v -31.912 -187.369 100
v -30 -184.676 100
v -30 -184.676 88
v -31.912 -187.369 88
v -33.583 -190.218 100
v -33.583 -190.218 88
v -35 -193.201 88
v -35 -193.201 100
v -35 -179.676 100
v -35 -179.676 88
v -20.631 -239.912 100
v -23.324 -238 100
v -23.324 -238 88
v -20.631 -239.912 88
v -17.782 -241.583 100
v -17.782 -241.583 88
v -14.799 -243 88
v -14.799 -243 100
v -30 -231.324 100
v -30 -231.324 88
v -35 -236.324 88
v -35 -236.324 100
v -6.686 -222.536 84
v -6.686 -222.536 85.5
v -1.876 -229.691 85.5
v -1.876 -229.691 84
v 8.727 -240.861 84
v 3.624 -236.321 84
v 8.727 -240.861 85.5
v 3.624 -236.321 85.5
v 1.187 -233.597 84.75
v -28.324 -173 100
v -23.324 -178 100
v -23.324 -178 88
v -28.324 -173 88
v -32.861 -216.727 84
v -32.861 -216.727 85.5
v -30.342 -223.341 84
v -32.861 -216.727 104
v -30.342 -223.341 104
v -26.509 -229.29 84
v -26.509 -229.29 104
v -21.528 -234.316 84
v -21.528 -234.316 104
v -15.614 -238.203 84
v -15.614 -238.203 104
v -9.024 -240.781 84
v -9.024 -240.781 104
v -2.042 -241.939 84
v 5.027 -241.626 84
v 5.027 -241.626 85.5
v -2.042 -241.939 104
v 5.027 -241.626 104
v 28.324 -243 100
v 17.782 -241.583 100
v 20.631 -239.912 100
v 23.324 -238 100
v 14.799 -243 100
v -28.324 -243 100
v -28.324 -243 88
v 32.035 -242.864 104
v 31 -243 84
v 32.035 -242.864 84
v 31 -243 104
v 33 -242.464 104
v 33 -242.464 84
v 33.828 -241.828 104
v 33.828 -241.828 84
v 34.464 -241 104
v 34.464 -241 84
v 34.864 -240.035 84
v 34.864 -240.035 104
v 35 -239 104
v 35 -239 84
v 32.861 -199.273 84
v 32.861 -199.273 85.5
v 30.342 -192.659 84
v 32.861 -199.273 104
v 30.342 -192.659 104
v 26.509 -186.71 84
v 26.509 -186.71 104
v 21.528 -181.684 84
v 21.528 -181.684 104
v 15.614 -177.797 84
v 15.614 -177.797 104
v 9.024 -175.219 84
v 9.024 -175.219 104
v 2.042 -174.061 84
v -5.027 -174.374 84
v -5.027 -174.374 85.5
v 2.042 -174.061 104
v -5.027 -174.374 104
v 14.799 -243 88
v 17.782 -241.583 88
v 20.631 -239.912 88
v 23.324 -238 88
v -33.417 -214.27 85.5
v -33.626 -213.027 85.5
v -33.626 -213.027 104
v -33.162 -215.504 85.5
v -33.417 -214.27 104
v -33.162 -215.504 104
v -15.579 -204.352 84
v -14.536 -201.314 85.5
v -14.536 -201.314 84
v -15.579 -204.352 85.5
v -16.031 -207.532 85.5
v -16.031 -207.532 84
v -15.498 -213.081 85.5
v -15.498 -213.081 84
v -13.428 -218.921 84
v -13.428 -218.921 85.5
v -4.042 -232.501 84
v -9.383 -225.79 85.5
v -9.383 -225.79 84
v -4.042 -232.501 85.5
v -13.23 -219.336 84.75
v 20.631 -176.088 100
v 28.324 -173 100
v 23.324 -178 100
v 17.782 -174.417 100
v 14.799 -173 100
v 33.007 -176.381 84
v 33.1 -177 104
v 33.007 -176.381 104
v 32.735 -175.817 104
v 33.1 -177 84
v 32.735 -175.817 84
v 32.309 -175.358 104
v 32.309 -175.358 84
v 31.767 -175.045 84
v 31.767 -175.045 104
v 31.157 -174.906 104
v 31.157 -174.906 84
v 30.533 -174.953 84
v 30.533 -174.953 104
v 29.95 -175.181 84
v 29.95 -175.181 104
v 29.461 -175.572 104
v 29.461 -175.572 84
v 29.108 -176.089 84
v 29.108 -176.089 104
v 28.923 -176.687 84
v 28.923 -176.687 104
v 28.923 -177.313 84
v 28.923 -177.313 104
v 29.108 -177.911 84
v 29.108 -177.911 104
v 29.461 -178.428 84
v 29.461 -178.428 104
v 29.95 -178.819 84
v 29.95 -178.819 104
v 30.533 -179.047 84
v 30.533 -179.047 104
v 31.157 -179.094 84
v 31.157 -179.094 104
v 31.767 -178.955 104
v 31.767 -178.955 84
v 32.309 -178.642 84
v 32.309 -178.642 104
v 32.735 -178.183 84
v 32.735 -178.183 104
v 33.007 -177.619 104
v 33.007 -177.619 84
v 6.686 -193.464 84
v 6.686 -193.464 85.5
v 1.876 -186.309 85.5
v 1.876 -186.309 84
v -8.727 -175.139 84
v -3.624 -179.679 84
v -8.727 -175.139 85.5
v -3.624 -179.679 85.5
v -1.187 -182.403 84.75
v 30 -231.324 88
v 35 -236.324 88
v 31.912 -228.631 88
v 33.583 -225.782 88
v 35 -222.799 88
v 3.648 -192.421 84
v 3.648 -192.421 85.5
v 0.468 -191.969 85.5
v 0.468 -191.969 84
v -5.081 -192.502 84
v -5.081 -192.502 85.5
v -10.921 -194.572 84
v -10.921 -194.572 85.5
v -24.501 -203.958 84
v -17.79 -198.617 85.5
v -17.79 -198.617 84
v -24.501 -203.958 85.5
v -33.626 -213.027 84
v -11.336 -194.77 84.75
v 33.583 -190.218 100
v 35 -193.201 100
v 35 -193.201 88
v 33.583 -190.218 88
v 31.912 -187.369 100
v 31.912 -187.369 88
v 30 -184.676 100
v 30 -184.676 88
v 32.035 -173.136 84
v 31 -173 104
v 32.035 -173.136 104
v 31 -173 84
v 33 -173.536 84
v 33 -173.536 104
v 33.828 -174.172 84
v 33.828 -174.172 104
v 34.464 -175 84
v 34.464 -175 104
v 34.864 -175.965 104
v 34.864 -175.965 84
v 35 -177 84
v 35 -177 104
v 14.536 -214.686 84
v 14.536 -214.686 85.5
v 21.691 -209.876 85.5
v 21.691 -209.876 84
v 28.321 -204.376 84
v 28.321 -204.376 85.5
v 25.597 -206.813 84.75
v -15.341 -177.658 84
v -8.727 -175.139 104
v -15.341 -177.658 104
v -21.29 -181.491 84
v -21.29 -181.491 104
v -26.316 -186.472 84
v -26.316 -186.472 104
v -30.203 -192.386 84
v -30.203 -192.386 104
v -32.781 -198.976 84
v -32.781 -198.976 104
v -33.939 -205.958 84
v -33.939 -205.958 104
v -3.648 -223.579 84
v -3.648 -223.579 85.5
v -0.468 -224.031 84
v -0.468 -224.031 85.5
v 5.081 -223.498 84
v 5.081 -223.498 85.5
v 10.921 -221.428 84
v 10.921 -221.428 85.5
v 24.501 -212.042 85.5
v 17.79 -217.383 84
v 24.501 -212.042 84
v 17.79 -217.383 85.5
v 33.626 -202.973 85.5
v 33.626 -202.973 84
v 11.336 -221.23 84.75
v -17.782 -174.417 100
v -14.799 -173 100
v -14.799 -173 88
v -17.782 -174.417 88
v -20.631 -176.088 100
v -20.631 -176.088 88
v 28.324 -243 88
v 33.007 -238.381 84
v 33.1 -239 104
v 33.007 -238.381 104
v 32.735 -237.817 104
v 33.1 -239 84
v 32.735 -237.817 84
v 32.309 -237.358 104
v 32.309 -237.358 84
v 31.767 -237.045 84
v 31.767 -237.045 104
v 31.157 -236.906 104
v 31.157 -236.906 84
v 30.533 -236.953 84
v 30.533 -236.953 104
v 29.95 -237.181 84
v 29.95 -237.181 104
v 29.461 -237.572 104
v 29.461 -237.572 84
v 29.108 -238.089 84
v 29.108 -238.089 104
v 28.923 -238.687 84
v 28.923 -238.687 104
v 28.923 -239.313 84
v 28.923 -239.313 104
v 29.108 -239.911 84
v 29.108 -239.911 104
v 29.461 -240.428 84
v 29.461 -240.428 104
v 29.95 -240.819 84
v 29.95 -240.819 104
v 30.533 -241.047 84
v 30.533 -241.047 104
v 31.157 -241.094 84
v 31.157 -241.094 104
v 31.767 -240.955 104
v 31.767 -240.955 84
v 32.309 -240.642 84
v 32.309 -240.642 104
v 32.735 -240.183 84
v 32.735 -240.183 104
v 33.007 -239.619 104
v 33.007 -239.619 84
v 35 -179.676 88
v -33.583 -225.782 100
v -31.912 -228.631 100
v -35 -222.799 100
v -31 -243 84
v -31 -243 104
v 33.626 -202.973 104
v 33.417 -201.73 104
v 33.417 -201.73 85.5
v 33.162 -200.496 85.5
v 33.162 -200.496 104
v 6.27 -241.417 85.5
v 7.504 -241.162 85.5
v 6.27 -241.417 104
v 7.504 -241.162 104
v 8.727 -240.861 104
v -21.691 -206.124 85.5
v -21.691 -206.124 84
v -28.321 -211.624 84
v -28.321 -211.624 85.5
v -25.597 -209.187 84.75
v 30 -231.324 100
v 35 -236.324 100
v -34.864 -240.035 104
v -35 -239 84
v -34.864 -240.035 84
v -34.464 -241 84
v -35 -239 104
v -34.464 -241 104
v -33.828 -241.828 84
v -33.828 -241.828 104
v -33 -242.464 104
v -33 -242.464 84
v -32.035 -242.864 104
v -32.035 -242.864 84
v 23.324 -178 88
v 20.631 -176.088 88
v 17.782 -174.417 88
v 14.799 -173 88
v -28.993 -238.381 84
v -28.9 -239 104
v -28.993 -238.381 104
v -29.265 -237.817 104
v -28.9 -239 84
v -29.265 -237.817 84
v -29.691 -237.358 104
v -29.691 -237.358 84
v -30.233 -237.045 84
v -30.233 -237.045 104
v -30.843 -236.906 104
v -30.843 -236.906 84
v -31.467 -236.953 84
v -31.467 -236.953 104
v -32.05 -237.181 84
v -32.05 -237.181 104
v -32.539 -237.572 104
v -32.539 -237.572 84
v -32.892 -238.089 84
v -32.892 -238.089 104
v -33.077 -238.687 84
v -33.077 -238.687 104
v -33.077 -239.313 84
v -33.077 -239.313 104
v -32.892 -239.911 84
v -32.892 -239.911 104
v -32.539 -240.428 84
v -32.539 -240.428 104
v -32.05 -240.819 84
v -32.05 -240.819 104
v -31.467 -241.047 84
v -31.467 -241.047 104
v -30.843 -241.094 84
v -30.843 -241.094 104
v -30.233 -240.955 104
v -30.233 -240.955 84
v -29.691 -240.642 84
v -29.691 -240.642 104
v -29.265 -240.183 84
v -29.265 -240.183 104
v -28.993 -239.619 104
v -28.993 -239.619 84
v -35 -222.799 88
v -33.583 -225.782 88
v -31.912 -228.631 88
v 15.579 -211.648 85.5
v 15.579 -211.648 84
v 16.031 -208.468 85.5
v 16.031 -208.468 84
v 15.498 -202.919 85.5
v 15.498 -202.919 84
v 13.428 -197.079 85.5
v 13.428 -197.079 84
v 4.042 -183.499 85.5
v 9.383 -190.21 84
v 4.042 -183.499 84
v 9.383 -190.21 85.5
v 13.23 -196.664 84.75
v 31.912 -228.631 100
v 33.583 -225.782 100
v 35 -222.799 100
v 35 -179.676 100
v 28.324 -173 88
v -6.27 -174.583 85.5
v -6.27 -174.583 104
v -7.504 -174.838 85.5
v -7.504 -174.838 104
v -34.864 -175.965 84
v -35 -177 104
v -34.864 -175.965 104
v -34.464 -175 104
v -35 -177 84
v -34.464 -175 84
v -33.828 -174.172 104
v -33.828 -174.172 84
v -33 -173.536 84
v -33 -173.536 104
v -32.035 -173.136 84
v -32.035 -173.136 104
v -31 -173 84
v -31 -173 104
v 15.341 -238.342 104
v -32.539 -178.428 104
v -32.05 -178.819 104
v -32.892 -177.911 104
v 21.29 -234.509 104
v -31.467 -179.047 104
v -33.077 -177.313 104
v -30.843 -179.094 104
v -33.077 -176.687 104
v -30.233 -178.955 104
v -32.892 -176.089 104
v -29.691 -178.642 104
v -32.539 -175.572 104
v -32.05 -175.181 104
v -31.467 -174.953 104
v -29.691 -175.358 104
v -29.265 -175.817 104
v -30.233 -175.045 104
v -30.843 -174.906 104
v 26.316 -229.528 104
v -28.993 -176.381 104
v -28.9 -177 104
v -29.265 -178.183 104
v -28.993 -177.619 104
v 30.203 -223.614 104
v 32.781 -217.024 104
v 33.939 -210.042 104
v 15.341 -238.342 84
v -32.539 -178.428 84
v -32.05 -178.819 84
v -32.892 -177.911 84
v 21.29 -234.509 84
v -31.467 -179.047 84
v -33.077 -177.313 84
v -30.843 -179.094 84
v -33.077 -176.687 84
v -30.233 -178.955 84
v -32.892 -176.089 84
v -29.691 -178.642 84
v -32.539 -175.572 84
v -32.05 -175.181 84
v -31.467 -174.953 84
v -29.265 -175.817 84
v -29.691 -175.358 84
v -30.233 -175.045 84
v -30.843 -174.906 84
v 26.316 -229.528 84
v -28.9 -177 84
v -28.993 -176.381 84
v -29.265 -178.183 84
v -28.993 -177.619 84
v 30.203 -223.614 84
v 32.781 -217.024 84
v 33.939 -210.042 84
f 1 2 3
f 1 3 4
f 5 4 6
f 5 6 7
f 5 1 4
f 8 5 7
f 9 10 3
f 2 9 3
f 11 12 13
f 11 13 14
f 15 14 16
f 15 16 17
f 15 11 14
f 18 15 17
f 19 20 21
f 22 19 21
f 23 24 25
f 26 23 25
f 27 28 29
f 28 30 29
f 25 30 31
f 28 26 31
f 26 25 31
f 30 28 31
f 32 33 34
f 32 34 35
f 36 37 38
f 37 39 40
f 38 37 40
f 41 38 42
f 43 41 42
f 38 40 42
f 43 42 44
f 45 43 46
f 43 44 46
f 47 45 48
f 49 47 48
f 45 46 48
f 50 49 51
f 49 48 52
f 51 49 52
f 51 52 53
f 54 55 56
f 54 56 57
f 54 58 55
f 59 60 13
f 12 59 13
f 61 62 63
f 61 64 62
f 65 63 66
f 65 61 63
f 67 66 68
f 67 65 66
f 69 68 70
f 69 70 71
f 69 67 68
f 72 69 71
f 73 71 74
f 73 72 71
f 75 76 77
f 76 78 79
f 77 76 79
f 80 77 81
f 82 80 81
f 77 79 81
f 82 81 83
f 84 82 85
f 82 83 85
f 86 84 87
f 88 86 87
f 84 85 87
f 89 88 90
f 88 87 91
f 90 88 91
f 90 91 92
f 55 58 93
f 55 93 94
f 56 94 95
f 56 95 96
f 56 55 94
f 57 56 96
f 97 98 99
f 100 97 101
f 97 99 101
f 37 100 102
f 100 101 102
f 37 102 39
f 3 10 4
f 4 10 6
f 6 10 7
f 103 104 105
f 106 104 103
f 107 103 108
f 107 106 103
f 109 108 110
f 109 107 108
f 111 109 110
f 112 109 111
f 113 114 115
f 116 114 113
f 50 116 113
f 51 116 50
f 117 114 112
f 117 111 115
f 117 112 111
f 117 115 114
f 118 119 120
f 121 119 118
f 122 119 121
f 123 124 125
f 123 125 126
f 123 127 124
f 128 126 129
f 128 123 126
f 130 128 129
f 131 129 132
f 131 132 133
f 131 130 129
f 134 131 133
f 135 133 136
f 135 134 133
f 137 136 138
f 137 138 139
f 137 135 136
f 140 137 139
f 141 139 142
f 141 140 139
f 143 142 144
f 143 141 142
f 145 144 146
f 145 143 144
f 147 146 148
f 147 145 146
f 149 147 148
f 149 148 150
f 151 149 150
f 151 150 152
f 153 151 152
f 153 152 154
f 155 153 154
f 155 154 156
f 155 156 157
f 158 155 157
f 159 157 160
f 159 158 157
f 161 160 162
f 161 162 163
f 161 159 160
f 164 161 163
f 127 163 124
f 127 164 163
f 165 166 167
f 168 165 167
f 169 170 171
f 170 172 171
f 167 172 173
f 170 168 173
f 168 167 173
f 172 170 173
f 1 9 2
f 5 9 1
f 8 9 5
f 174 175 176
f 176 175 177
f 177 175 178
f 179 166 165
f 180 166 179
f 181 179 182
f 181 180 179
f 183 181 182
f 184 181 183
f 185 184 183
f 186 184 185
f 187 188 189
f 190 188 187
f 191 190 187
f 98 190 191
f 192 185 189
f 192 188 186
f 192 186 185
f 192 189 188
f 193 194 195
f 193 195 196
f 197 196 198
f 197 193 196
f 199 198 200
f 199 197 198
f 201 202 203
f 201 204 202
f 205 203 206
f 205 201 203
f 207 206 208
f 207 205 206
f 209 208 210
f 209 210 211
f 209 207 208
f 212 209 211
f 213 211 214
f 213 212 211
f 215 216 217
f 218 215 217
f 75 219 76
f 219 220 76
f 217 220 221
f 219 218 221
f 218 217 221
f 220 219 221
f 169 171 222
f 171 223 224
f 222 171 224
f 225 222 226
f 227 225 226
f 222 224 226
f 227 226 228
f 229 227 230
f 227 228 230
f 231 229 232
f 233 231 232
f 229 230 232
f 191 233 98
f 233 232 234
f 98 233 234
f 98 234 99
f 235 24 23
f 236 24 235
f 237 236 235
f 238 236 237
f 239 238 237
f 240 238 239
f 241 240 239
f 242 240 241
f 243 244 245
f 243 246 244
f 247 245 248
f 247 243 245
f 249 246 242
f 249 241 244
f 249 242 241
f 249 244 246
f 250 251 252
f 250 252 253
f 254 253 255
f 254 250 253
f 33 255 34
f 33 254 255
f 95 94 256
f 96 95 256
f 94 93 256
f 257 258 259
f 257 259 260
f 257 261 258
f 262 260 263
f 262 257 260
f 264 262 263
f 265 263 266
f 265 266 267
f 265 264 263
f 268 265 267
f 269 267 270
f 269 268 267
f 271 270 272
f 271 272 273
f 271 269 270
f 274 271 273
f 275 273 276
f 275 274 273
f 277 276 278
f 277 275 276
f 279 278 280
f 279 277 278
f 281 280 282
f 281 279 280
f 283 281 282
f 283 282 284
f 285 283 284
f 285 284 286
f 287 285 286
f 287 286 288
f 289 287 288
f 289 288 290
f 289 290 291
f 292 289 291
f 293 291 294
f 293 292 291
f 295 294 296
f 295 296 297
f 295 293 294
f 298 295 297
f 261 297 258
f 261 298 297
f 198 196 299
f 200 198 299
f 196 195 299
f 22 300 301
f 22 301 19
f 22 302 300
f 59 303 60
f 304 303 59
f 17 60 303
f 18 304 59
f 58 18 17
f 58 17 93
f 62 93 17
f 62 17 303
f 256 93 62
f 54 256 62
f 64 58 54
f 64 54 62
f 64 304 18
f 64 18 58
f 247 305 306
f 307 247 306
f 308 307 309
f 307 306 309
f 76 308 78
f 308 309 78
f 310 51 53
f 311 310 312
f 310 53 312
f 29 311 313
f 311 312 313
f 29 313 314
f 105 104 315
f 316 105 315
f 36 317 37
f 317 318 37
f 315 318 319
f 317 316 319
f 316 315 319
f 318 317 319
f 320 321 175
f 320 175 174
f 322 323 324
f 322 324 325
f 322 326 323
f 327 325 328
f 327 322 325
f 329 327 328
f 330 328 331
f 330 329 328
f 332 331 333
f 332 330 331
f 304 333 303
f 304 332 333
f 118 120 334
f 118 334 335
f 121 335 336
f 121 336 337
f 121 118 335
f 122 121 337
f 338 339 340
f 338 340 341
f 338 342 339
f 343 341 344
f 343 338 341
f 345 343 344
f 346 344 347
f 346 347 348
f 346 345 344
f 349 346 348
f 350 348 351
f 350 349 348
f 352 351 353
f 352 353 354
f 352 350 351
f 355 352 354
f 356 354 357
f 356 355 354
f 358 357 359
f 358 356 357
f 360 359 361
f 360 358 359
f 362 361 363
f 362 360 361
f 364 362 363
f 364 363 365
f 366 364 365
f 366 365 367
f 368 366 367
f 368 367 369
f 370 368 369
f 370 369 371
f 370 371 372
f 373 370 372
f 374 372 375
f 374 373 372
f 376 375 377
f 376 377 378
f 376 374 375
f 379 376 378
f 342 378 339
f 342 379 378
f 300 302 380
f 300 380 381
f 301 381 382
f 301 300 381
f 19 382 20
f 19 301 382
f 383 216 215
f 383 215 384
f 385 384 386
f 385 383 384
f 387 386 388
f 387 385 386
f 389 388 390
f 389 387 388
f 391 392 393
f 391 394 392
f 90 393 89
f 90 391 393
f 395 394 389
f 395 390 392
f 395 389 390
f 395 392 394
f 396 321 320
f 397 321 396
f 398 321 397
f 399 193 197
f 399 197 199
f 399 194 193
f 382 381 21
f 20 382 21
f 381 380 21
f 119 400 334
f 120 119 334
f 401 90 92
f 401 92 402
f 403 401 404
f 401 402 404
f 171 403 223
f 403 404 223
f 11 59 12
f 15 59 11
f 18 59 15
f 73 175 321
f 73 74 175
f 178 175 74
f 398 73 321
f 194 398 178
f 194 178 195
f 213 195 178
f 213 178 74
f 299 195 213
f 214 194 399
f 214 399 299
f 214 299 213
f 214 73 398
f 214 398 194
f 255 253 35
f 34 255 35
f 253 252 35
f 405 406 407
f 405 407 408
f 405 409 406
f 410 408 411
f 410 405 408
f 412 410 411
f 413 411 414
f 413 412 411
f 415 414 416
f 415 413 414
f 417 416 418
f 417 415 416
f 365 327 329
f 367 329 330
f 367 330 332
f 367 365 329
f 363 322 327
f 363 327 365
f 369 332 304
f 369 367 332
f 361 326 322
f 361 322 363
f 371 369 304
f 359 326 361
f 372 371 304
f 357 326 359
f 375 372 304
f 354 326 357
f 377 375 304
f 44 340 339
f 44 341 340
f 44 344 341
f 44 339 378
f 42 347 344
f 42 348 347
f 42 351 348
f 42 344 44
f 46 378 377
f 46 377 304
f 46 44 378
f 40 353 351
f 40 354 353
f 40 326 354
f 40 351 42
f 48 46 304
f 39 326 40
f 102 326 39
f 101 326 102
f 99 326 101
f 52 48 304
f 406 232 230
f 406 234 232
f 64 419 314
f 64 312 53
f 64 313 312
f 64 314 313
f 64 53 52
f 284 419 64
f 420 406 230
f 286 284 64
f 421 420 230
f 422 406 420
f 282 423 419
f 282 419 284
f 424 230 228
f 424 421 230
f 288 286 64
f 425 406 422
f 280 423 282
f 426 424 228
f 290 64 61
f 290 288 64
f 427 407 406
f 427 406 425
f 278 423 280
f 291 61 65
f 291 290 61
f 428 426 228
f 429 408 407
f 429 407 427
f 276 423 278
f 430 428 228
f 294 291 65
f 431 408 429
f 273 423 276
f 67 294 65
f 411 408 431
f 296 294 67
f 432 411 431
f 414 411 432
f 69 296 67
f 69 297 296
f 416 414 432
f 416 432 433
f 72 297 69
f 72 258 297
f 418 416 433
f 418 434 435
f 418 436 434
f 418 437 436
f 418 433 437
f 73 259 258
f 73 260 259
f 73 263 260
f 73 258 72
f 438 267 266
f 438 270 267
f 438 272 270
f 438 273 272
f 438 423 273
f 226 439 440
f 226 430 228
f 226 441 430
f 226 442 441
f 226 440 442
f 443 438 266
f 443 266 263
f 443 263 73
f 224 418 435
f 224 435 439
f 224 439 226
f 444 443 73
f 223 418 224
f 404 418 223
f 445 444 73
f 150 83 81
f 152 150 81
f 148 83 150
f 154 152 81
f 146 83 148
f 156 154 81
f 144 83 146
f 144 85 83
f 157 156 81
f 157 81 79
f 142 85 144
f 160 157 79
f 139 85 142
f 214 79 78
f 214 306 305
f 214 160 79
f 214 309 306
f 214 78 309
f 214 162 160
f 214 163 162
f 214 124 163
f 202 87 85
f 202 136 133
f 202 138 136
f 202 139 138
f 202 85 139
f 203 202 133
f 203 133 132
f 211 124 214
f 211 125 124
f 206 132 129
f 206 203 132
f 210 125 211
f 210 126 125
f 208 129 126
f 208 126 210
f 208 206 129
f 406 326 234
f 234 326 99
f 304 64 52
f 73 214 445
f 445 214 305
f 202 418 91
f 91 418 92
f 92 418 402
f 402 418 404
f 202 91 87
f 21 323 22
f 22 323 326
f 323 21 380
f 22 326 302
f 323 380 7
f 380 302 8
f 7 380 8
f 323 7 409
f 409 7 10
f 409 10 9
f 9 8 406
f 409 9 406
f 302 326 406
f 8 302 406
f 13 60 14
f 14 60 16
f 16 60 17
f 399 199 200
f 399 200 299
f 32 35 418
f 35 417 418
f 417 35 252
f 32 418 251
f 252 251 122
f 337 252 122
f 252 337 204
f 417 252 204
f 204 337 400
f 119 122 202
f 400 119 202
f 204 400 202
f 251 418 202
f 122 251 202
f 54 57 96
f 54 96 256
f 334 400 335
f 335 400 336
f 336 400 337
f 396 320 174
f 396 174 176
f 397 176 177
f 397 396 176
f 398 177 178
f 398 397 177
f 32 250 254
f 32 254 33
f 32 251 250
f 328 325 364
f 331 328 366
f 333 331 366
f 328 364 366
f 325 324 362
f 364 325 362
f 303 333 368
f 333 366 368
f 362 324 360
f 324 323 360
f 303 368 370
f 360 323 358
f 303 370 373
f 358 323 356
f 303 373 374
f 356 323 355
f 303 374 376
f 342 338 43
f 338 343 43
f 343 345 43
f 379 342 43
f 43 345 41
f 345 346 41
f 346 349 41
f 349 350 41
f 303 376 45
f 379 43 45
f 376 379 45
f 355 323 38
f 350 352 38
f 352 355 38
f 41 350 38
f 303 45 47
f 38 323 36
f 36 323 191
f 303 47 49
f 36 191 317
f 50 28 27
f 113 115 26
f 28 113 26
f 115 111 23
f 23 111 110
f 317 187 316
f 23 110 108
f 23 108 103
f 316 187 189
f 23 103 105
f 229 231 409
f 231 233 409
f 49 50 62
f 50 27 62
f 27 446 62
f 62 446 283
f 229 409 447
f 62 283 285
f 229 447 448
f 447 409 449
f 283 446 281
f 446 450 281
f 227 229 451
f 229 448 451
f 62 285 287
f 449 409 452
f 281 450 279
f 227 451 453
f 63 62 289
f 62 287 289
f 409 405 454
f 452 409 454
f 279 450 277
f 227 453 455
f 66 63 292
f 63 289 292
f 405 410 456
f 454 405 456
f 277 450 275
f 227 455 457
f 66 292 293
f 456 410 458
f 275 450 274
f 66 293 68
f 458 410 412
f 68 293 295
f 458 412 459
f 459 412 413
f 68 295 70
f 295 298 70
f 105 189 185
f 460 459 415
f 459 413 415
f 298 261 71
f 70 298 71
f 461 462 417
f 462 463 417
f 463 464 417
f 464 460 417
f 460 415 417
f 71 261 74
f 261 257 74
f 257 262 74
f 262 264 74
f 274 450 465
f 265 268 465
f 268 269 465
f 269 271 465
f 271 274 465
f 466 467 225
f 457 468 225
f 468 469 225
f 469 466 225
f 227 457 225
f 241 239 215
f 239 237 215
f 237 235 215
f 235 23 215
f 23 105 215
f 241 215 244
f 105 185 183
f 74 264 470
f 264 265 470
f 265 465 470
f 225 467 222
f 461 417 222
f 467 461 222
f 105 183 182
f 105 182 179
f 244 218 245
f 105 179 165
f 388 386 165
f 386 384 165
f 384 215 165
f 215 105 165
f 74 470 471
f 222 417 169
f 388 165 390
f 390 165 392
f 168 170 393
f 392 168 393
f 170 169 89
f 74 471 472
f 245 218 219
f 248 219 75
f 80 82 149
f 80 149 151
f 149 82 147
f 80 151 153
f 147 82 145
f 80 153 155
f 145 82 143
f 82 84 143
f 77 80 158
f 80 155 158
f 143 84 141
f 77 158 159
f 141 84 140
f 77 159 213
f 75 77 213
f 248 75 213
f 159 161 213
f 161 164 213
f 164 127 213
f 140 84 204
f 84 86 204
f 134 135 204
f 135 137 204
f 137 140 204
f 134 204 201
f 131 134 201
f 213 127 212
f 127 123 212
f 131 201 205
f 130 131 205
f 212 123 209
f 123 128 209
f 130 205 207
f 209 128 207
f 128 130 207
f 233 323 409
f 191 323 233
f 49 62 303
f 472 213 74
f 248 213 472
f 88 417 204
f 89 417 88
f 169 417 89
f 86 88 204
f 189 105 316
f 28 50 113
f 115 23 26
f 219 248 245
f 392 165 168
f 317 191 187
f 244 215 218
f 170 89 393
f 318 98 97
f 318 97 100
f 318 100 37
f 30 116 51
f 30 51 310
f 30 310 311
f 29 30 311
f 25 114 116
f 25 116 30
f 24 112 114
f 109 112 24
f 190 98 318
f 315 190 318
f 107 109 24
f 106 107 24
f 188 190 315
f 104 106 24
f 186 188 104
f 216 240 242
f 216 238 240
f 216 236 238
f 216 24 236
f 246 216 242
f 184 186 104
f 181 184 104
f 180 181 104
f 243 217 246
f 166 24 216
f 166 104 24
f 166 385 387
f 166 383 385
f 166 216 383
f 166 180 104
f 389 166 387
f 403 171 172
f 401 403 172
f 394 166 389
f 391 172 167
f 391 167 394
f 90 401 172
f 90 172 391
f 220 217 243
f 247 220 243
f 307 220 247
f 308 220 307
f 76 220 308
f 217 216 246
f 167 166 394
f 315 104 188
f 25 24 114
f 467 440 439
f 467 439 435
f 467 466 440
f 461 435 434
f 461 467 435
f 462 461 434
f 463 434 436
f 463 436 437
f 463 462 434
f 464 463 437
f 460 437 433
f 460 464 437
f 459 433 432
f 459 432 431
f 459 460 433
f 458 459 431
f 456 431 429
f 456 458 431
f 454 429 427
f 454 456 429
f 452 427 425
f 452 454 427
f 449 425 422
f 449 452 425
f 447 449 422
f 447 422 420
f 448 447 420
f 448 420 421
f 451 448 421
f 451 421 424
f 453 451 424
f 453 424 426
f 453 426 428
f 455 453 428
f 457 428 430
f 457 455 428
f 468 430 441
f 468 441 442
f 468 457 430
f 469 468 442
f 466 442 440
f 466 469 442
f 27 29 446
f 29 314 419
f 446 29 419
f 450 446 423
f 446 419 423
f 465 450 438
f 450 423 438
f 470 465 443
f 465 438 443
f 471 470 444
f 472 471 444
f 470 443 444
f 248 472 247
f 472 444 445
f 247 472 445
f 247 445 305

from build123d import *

# Parameters (mm, degrees)
SKETCH030_W           = 70
SKETCH030_H           = 70
SKETCH030_R           = 2.1
PAD019_DEPTH          = 10
POCKET014_DEPTH       = 221.9910987672
POLARPATTERN002_COUNT = 4
FILLET011_R           = 4
SKETCH032_R           = 34
POCKET018_DEPTH       = 18.5
POCKET017_DEPTH       = 6
POLARPATTERN003_COUNT = 4


with BuildPart() as part:
    # Sketch030 → Pad019 (new body, symmetric)
    with BuildSketch(Plane.XY):
        Rectangle(SKETCH030_W, SKETCH030_H)
        with Locations((-31, 31)):
            Circle(SKETCH030_R, mode=Mode.SUBTRACT)
        with Locations((31, 31)):
            Circle(SKETCH030_R, mode=Mode.SUBTRACT)
        with Locations((31, -31)):
            Circle(SKETCH030_R, mode=Mode.SUBTRACT)
        with Locations((-31, -31)):
            Circle(SKETCH030_R, mode=Mode.SUBTRACT)
    extrude(amount=PAD019_DEPTH, both=True)

    # Sketch029 (on Face10 of Pad019) → Pocket014 (cut, through all)
    with BuildSketch(Plane.XY.offset(10)):
        with BuildLine():
            ThreePointArc((-8.7274847969, 32.8607822354), (-28.4137092085, 18.6724698156), (-33.6262546007, -5.0274249403))
            add(Edge.make_bspline(
                [(6.6856437151, 14.5362363807), (-9.201321, 21.706085), (-33.6262546007, -5.0274249403)],
                knots=[0, 0, 0, 1, 1, 1], degree=2))
            add(Edge.make_bspline(
                [(6.6856437151, 14.5362363807), (-1.353872, 27.495132), (-8.7274847969, 32.8607822354)],
                knots=[0, 0, 0, 1, 1, 1], degree=2))
        make_face()
    pocket014 = extrude(amount=-POCKET014_DEPTH, mode=Mode.SUBTRACT)

    # PolarPattern002: Pocket014 ×4 about axis
    polarpattern002_axis = Axis((0, 0, 10), (0, 0, 1))
    for i in range(1, POLARPATTERN002_COUNT):
        add(pocket014.rotate(polarpattern002_axis, i * 360 / POLARPATTERN002_COUNT), mode=Mode.SUBTRACT)

    # Fillet011
    fillet011_edges = [part.edges().sort_by_distance(p)[0] for p in [
        (35, 35, 0),
        (-35, 35, 0),
        (35, -35, 0),
        (-35, -35, 0),
    ]]
    fillet(fillet011_edges, radius=FILLET011_R)

    # Sketch032 (on Face5 of Fillet011) → Pocket018 (cut)
    with BuildSketch(Plane.XY.offset(10)):
        Circle(SKETCH032_R)
    extrude(amount=-POCKET018_DEPTH, mode=Mode.SUBTRACT)

    # Sketch033 → Pocket017 (cut, symmetric)
    with BuildSketch(Plane.XY):
        with BuildLine():
            ThreePointArc((23.3238075794, 30), (0, 38), (-23.3238075794, 30))
            Line((-23.3238075794, 30), (-29, 35.6761924206))
            Line((-29, 35.6761924206), (-29, 47.6761924206))
            Line((-29, 47.6761924206), (29, 47.6761924206))
            Line((29, 47.6761924206), (29, 35.6761924206))
            Line((29, 35.6761924206), (23.3238075794, 30))
        make_face()
    pocket017 = extrude(amount=POCKET017_DEPTH, both=True, mode=Mode.SUBTRACT)

    # PolarPattern003: Pocket017 ×4 about axis
    polarpattern003_axis = Axis((0, 0, 0), (0, 0, 1))
    for i in range(1, POLARPATTERN003_COUNT):
        add(pocket017.rotate(polarpattern003_axis, i * 360 / POLARPATTERN003_COUNT), mode=Mode.SUBTRACT)


with BuildPart() as part_1:
    # Body013 placement: moved
    add(part.part.moved(Location((0, -208, 94))))


solid = part_1.part
